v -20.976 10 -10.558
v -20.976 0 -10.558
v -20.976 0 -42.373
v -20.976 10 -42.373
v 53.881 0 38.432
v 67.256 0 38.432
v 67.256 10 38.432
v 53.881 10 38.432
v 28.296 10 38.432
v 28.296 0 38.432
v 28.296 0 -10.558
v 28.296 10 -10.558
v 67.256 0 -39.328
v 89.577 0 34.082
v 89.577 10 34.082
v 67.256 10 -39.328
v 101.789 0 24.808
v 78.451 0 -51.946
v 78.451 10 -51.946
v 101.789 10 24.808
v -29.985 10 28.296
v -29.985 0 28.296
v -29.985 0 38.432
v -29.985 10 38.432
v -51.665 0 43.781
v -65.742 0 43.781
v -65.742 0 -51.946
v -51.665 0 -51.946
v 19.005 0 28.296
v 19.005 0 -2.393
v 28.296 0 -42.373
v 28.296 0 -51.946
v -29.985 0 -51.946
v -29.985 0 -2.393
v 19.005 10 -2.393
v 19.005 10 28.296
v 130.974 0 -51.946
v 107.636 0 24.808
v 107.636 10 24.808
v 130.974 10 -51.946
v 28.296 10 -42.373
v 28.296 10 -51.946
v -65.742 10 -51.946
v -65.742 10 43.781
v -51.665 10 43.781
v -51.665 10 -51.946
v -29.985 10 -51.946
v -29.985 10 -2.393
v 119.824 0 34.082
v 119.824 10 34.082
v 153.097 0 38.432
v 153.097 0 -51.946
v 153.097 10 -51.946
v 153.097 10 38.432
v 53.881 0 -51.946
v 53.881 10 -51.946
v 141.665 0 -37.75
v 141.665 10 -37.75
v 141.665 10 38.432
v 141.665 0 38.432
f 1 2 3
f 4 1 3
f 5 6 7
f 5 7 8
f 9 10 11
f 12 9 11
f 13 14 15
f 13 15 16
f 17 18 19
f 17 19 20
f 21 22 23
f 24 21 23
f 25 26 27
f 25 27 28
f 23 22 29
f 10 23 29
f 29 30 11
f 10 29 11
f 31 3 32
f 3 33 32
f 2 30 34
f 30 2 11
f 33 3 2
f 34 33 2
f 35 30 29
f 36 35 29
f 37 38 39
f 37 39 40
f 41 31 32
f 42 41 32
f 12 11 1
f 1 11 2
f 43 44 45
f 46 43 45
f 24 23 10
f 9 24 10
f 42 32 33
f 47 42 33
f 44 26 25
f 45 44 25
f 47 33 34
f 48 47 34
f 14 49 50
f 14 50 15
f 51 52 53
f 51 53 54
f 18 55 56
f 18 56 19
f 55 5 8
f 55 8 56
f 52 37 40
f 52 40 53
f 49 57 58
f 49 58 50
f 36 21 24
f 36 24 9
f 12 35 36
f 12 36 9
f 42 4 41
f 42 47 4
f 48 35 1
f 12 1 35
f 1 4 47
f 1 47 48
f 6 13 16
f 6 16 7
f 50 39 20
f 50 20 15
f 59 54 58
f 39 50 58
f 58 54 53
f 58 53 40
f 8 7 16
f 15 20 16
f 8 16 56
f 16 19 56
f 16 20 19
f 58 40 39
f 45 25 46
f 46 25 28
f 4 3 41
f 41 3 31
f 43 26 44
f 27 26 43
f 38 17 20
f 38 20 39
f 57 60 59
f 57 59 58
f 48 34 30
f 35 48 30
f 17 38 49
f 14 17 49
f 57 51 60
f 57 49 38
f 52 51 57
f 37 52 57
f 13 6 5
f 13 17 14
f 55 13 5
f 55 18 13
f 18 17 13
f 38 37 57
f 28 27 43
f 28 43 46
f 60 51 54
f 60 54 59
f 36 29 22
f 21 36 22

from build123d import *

# Parameters (mm, degrees)
SKETCH1_W             = 14.077534264
SKETCH1_H             = 95.727232995
BOSS_EXTRUDE1_DEPTH   = 10
BOSS_EXTRUDE1_2_DEPTH = 10
BOSS_EXTRUDE1_3_DEPTH = 10


with BuildPart() as part:
    # Sketch1 → Boss-Extrude1 (new body)
    with BuildSketch(Plane(origin=(0, 0, 0), x_dir=(1, 0, 0), z_dir=(0, 1, 0))):
        with Locations((-58.70331788, 4.082484937)):
            Rectangle(SKETCH1_W, SKETCH1_H)
    extrude(amount=BOSS_EXTRUDE1_DEPTH)


with BuildPart() as body_2:
    # Sketch1 → Boss-Extrude1 2 (new body)
    with BuildSketch(Plane(origin=(0, 0, 0), x_dir=(1, 0, 0), z_dir=(0, 1, 0))):
        Polygon((53.881234625, -38.43166854), (53.881234625, 51.946101434), (78.450636619, 51.946101434), (101.788622724, -24.807745079), (107.63617878, -24.807745079), (130.974164885, 51.946101434), (153.096678858, 51.946101434), (153.096678858, -38.43166854), (141.665334196, -38.43166854), (141.665334196, 37.749510192), (119.823976618, -34.082232257), (89.577457677, -34.082232257), (67.25598854, 39.328498573), (67.25598854, -38.43166854), align=None)
    extrude(amount=BOSS_EXTRUDE1_2_DEPTH)


with BuildPart() as body_3:
    # Sketch1 → Boss-Extrude1 3 (new body)
    with BuildSketch(Plane(origin=(0, 0, 0), x_dir=(1, 0, 0), z_dir=(0, 1, 0))):
        Polygon((28.29584387, 51.946101434), (-29.985147982, 51.946101434), (-29.985147982, 2.393180825), (19.004671256, 2.393180825), (19.004671256, -28.29584387), (-29.985147982, -28.29584387), (-29.985147982, -38.43166854), (28.29584387, -38.43166854), (28.29584387, 10.558150698), (-20.975526053, 10.558150698), (-20.975526053, 42.373378134), (28.29584387, 42.373378134), align=None)
    extrude(amount=BOSS_EXTRUDE1_3_DEPTH)


solid = Compound([part.part, body_2.part, body_3.part])
